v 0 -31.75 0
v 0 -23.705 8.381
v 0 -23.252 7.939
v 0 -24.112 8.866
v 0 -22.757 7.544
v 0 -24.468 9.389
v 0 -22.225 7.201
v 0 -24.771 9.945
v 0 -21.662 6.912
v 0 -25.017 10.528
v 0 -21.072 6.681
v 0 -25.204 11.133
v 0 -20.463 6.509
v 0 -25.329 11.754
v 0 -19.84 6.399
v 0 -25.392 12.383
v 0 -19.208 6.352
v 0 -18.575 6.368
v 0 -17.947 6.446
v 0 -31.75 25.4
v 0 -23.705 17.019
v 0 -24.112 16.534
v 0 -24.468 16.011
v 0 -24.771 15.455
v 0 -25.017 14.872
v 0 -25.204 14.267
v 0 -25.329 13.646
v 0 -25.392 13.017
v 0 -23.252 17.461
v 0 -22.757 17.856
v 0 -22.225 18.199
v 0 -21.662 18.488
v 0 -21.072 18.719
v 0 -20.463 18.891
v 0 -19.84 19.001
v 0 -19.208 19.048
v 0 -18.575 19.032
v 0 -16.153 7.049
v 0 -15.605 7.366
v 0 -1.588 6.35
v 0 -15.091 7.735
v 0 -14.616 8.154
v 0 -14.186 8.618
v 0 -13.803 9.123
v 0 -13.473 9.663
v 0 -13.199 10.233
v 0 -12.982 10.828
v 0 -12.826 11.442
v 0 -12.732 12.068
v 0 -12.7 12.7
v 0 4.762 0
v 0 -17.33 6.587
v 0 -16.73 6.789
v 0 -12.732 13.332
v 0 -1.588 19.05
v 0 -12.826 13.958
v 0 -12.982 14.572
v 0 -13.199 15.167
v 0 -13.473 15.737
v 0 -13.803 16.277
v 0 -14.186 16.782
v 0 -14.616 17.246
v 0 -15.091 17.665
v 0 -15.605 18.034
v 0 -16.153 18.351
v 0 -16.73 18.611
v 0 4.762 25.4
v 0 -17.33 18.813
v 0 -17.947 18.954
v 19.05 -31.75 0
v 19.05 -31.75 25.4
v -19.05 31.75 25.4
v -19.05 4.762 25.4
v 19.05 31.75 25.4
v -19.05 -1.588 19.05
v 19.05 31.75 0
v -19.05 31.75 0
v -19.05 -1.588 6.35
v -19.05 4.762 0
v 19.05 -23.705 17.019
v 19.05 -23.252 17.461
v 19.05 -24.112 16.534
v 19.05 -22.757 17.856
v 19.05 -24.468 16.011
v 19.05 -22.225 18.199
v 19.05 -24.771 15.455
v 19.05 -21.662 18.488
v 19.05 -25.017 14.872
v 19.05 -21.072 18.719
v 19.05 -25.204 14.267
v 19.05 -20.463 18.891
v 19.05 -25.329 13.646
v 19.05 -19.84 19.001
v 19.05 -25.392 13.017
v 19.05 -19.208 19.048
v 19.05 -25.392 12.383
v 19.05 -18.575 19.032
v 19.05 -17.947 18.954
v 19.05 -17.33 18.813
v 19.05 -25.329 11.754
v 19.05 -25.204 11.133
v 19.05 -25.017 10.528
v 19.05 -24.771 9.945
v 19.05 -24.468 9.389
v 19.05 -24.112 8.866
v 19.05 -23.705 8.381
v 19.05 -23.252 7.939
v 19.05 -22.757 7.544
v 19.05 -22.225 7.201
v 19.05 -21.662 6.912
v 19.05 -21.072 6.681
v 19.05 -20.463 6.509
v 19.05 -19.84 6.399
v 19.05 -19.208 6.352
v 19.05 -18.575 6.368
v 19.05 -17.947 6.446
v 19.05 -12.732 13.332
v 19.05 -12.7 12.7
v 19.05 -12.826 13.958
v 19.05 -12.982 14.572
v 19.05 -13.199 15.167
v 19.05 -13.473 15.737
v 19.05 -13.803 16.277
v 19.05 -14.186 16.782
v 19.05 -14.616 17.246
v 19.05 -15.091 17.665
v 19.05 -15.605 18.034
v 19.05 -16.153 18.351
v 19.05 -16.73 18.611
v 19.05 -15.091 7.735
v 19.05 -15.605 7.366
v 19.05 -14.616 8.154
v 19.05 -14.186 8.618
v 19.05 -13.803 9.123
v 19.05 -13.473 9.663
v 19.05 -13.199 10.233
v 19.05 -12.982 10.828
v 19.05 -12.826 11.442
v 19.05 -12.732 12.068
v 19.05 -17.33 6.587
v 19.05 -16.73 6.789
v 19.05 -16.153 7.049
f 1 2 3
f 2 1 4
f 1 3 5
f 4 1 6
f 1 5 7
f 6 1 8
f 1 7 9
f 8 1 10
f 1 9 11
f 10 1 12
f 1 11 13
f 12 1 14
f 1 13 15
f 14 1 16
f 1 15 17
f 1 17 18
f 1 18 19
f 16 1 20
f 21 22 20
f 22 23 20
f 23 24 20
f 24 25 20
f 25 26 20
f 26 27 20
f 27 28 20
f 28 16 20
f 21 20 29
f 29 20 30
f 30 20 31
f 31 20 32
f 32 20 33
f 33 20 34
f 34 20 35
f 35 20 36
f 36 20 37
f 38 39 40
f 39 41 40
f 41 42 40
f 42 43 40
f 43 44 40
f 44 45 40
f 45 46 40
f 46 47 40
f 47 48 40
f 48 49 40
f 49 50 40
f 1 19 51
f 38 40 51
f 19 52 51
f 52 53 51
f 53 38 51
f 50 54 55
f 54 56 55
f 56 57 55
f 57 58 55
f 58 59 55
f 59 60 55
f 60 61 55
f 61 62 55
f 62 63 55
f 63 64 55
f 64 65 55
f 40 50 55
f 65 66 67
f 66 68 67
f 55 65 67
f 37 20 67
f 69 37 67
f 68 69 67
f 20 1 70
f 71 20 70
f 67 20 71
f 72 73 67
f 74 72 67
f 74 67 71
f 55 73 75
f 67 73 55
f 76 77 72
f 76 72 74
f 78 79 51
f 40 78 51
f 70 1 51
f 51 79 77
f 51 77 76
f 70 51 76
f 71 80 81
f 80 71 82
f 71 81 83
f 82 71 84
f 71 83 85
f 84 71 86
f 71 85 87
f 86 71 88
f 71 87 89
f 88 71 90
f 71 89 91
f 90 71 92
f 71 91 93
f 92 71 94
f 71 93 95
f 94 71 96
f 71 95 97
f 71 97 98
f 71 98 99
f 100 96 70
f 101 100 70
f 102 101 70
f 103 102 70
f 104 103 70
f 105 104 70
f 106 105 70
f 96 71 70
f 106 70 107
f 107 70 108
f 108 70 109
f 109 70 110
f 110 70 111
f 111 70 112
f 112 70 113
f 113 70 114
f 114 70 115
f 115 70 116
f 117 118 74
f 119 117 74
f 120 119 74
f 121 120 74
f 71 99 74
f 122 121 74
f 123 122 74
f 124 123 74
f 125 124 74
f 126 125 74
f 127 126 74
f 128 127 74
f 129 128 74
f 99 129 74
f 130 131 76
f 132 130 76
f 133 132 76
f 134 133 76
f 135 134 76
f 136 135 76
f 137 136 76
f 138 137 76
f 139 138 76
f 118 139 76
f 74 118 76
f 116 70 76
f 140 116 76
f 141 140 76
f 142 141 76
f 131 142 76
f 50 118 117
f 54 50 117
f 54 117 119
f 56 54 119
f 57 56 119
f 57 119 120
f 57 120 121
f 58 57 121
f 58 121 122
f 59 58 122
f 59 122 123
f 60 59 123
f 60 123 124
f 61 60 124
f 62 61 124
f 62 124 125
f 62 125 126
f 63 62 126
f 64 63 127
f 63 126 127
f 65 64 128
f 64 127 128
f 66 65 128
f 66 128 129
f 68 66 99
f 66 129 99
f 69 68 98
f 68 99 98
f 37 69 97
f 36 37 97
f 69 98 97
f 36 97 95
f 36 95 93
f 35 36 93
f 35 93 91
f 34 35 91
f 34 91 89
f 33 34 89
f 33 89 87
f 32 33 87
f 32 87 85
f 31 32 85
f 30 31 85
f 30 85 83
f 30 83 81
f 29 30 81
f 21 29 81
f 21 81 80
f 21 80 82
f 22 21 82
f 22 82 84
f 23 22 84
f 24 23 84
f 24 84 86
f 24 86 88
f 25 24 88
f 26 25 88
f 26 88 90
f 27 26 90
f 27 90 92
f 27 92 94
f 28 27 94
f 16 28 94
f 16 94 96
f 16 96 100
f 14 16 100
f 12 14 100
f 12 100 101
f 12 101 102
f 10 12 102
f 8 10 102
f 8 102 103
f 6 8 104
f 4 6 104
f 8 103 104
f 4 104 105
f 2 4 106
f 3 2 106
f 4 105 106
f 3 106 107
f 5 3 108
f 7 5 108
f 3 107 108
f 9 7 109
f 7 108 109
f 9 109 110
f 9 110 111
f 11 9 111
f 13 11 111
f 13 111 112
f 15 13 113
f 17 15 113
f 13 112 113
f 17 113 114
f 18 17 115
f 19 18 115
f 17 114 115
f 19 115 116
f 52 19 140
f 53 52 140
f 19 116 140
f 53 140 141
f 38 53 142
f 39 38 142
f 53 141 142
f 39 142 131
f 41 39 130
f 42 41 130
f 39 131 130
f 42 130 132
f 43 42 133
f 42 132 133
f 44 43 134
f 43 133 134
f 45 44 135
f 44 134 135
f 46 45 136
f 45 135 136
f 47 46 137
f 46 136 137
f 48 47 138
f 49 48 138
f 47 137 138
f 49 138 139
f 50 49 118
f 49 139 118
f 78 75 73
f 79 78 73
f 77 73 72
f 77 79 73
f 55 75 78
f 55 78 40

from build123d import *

# Parameters (mm, degrees)
F0_W     = 38.1
F0_H     = 63.5
F1_DEPTH = 25.4
F2_W     = 19.05
F2_H     = 26.9875
F3_DEPTH = 25.4
F4_R     = 6.35
F5_DEPTH = 25.4
F6_DEPTH = 3.175
F7_SIZE  = 6.35


with BuildPart() as f1:
    # F0 (on Top) → F1 (new body)
    with BuildSketch(Plane.XY):
        Rectangle(F0_W, F0_H)
    extrude(amount=F1_DEPTH)

    # F2 (on face) → F3 (cut)
    with BuildSketch(Plane.XY.offset(25.4)):
        with Locations((-9.525, -18.25625)):
            Rectangle(F2_W, F2_H)
    extrude(amount=-F3_DEPTH, mode=Mode.SUBTRACT)

    # F4 (on face) → F5 (cut)
    with BuildSketch(Plane.YZ.offset(19.05)):
        with Locations((-19.05, 12.7)):
            Circle(F4_R)
    extrude(amount=-F5_DEPTH, mode=Mode.SUBTRACT)

    # F6 (cut): a face of the model
    f6_faces = [f1.faces().sort_by_distance(p)[0] for p in [
        (-9.525, -4.7625, 12.7),
    ]]
    extrude(f6_faces, amount=-F6_DEPTH, mode=Mode.SUBTRACT)

    # F7
    f7_edges = [f1.edges().sort_by_distance(p)[0] for p in [
        (-9.525, -1.5875, 25.4),
        (-9.525, -1.5875, 0),
    ]]
    chamfer(f7_edges, length=F7_SIZE)


solid = f1.part
